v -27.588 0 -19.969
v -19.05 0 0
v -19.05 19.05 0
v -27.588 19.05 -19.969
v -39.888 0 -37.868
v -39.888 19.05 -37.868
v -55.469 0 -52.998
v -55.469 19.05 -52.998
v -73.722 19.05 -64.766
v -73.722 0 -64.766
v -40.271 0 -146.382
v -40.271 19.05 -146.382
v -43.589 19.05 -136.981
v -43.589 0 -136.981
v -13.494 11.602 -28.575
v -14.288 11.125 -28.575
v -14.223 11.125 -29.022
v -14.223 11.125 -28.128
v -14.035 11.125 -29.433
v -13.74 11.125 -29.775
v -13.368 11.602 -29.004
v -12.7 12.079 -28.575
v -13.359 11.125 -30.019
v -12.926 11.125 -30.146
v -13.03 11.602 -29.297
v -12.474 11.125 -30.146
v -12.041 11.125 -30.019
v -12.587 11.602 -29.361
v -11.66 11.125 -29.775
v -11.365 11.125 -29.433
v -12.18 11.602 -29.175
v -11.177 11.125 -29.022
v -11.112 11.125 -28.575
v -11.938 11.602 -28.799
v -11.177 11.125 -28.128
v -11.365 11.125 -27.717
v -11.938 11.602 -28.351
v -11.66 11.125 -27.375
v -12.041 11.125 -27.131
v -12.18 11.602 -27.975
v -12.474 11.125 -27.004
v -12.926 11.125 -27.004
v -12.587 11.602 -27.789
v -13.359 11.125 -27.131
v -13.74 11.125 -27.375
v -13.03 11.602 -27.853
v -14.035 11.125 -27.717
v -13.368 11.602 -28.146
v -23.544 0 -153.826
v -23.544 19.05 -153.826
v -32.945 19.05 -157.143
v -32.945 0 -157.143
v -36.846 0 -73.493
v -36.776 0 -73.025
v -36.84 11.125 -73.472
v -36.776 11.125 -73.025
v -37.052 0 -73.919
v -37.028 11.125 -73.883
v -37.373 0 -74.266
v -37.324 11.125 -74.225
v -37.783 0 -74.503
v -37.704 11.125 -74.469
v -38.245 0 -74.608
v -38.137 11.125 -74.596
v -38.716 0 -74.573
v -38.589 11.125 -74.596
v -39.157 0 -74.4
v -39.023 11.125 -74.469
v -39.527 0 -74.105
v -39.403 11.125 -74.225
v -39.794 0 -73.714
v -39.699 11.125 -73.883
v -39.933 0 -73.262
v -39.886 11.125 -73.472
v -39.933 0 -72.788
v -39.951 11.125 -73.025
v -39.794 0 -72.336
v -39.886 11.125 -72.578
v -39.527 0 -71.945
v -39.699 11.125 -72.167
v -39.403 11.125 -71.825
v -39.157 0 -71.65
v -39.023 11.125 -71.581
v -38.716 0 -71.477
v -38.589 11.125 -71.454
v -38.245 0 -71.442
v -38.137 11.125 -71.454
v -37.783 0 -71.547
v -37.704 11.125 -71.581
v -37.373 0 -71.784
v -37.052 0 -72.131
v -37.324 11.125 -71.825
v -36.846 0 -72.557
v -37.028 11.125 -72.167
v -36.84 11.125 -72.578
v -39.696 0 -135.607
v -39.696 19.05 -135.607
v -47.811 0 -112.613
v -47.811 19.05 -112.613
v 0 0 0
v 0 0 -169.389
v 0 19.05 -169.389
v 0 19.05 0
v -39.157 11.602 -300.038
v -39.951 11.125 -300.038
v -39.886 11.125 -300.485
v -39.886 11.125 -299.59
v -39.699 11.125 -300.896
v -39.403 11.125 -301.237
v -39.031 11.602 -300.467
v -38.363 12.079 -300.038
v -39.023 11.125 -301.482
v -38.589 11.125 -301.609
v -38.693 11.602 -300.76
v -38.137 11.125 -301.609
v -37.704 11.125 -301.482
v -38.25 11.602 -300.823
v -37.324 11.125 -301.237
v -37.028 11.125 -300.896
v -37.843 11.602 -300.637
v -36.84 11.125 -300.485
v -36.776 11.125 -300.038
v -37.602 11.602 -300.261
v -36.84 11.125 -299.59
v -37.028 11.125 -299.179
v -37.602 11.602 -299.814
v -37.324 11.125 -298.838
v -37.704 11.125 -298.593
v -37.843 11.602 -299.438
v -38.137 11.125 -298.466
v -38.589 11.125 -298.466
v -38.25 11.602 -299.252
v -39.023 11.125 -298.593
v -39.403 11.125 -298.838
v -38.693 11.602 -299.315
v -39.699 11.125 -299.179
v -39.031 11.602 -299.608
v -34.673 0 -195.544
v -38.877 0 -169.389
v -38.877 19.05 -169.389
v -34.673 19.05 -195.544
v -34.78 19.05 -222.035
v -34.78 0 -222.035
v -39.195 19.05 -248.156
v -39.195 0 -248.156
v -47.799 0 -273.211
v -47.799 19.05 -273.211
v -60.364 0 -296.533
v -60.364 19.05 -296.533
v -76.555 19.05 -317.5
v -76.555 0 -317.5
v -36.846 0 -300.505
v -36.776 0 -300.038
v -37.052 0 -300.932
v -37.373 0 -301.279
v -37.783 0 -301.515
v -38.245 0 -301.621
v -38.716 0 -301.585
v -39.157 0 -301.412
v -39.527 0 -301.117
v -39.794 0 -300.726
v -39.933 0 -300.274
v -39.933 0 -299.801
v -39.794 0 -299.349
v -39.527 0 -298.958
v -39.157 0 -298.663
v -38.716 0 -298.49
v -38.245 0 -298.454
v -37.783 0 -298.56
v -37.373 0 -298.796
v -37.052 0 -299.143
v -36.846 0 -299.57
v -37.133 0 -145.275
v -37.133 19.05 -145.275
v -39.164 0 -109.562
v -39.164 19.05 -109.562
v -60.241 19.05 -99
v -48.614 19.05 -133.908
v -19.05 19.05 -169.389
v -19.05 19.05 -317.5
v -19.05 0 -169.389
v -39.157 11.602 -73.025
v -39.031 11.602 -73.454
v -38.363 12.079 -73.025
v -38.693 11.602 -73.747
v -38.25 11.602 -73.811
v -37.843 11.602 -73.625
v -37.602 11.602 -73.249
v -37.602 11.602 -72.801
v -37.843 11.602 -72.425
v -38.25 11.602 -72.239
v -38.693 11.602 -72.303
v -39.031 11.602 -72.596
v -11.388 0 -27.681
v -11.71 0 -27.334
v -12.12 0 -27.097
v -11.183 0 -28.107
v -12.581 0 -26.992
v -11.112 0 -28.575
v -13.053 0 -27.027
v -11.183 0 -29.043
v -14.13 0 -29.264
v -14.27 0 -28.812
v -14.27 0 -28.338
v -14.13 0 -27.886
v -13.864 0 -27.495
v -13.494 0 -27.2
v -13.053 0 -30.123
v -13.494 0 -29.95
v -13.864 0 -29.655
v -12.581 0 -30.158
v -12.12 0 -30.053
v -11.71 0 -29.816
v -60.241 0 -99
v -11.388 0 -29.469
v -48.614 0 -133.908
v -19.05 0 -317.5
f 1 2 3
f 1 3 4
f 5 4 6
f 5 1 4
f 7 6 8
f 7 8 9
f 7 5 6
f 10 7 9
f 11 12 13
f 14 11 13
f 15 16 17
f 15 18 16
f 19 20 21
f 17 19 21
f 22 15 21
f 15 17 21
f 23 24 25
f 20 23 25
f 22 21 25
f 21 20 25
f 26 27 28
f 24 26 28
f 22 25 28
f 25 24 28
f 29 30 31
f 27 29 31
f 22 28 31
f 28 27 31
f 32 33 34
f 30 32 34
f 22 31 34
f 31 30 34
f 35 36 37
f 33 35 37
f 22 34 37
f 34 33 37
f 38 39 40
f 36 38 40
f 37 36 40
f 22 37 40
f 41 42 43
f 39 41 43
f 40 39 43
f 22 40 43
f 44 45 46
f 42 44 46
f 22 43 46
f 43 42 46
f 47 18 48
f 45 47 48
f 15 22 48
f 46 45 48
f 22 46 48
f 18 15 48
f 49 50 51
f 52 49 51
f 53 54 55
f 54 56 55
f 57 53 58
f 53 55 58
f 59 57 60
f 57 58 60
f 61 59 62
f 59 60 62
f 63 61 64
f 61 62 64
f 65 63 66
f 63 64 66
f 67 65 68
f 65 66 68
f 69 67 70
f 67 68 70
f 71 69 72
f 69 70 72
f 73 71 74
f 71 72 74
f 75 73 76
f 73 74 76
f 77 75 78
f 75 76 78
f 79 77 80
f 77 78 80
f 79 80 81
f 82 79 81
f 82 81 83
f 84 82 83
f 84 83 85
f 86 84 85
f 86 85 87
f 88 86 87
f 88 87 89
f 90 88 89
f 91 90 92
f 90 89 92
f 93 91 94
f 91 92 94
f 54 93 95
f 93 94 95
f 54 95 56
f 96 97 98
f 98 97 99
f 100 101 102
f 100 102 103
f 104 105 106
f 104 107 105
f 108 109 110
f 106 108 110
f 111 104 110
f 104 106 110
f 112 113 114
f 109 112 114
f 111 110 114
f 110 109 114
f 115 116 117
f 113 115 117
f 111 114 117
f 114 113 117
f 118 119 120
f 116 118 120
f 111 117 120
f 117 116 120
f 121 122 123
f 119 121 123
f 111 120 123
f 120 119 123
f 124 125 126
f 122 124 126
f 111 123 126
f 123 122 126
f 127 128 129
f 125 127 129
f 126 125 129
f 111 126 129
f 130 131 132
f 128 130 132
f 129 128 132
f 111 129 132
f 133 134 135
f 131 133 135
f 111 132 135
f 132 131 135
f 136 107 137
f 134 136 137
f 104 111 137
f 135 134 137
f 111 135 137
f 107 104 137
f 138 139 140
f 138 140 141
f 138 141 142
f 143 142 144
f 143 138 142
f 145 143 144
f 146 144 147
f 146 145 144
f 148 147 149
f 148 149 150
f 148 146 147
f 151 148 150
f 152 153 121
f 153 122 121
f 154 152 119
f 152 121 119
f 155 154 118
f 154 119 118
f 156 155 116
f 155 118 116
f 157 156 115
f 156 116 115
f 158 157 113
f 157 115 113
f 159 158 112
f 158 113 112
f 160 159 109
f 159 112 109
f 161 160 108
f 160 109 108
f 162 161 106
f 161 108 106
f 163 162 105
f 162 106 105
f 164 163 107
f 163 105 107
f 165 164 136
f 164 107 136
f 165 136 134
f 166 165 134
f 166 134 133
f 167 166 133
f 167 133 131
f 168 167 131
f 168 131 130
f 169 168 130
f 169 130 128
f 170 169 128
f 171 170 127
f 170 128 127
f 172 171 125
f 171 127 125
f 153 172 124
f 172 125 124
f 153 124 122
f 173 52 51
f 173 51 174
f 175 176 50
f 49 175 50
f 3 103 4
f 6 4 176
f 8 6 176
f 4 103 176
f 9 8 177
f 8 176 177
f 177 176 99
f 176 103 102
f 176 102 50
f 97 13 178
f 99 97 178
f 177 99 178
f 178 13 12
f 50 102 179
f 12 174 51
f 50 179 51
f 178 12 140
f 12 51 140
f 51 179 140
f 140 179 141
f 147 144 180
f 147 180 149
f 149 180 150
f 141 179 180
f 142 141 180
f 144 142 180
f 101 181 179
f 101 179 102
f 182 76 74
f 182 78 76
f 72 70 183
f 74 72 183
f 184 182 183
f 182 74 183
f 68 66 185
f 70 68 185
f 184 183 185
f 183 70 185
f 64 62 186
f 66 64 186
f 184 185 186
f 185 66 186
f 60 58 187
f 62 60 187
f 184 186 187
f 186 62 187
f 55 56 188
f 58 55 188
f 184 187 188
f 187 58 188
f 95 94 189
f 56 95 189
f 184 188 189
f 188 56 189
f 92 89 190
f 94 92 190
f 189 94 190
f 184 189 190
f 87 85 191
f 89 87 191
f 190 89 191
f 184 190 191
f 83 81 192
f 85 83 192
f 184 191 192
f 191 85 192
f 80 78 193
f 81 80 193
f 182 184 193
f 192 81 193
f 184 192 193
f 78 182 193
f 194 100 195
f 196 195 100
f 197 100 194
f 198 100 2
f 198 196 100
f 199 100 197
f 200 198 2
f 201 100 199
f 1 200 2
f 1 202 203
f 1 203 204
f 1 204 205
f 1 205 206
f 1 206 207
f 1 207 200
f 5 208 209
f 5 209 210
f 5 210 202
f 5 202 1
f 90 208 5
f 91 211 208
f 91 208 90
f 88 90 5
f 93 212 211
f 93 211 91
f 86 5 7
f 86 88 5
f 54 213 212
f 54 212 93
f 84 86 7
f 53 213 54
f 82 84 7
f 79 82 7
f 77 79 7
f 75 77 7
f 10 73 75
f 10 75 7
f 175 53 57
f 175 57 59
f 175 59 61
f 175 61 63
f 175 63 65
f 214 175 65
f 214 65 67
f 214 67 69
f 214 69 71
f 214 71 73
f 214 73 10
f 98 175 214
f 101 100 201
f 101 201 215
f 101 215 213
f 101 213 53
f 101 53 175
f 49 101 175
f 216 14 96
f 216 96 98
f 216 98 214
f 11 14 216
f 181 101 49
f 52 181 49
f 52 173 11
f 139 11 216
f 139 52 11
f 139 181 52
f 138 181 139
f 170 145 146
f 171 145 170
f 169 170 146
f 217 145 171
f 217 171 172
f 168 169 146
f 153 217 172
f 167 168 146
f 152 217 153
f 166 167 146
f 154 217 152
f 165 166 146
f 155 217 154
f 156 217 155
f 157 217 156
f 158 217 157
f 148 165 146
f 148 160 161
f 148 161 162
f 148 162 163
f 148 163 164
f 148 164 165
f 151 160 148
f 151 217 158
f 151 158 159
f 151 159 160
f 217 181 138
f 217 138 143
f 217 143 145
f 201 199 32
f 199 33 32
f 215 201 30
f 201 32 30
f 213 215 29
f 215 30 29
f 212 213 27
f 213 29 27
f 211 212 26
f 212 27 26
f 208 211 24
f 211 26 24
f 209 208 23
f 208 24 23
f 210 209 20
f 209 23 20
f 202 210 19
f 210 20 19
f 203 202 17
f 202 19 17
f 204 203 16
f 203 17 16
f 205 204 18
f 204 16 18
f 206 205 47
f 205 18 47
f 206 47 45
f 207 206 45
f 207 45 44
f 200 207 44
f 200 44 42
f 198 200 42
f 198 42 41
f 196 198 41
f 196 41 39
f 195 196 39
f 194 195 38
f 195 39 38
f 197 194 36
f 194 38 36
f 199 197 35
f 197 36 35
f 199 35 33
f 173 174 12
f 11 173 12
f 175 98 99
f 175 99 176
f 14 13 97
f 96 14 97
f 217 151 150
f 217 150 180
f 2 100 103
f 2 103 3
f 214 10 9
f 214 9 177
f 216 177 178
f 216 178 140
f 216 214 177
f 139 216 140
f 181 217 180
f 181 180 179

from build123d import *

# Parameters (mm, degrees)
BOSS_EXTRUDE1_DEPTH              = 19.05
CUT_EXTRUDE2_DEPTH               = 328.154074659
F_1_8_0_125_DIAMETER_HOLE1_D     = 3.175
F_1_8_0_125_DIAMETER_HOLE1_DEPTH = 11.1252
F_1_8_0_125_DIAMETER_HOLE1_TIP   = 0.953866233


with BuildPart() as part:
    # Sketch1 → Boss-Extrude1 (new body)
    with BuildSketch(Plane(origin=(0, 0, 0), x_dir=(1, 0, 0), z_dir=(0, 1, 0))):
        with BuildLine():
            Line((0, 169.388632852), (0, 0))
            Line((0, 0), (-19.05, 0))
            ThreePointArc((-19.05, 0), (-39.88804557, 37.868270719), (-73.722410895, 64.765590165))
            ThreePointArc((-73.722410895, 64.765590165), (-54.193392954, 116.375662835), (-38.876501861, 169.388632852))
            ThreePointArc((-38.876501861, 169.388632852), (-39.194658591, 248.155900408), (-76.554791267, 317.5))
            Line((-76.554791267, 317.5), (-19.05, 317.5))
            Line((-19.05, 317.5), (-19.05, 169.388632852))
            Line((-19.05, 169.388632852), (0, 169.388632852))
        make_face()
    extrude(amount=BOSS_EXTRUDE1_DEPTH)

    # Sketch2 → Cut-Extrude2 (cut, through all)
    with BuildSketch(Plane(origin=(0, 19.05, 0), x_dir=(1, 0, 0), z_dir=(0, 1, 0))):
        Polygon((-39.164098049, 109.561842364), (-23.543572116, 153.825683885), (-32.944847981, 157.143355113), (-37.133143759, 145.274992843), (-40.27089443, 146.38229203), (-43.588565658, 136.981016166), (-39.696317688, 135.607458014), (-47.810876614, 112.613254626), align=None)
    extrude(amount=-CUT_EXTRUDE2_DEPTH, mode=Mode.SUBTRACT)

    # 1/8 (0.125) Diameter Hole1
    with Locations(Plane(origin=(0, 0, 0), x_dir=(-1, 0, 0), z_dir=(0, -1, 0))):
        with Locations((12.7, 28.575), (38.363219465, 73.025), (38.363219465, 300.0375)):
            Hole(F_1_8_0_125_DIAMETER_HOLE1_D / 2, depth=F_1_8_0_125_DIAMETER_HOLE1_DEPTH)
            with Locations((0, 0, -(F_1_8_0_125_DIAMETER_HOLE1_DEPTH + F_1_8_0_125_DIAMETER_HOLE1_TIP / 2))):  # 118° drill point
                Cone(0, F_1_8_0_125_DIAMETER_HOLE1_D / 2, F_1_8_0_125_DIAMETER_HOLE1_TIP, mode=Mode.SUBTRACT)


solid = part.part
